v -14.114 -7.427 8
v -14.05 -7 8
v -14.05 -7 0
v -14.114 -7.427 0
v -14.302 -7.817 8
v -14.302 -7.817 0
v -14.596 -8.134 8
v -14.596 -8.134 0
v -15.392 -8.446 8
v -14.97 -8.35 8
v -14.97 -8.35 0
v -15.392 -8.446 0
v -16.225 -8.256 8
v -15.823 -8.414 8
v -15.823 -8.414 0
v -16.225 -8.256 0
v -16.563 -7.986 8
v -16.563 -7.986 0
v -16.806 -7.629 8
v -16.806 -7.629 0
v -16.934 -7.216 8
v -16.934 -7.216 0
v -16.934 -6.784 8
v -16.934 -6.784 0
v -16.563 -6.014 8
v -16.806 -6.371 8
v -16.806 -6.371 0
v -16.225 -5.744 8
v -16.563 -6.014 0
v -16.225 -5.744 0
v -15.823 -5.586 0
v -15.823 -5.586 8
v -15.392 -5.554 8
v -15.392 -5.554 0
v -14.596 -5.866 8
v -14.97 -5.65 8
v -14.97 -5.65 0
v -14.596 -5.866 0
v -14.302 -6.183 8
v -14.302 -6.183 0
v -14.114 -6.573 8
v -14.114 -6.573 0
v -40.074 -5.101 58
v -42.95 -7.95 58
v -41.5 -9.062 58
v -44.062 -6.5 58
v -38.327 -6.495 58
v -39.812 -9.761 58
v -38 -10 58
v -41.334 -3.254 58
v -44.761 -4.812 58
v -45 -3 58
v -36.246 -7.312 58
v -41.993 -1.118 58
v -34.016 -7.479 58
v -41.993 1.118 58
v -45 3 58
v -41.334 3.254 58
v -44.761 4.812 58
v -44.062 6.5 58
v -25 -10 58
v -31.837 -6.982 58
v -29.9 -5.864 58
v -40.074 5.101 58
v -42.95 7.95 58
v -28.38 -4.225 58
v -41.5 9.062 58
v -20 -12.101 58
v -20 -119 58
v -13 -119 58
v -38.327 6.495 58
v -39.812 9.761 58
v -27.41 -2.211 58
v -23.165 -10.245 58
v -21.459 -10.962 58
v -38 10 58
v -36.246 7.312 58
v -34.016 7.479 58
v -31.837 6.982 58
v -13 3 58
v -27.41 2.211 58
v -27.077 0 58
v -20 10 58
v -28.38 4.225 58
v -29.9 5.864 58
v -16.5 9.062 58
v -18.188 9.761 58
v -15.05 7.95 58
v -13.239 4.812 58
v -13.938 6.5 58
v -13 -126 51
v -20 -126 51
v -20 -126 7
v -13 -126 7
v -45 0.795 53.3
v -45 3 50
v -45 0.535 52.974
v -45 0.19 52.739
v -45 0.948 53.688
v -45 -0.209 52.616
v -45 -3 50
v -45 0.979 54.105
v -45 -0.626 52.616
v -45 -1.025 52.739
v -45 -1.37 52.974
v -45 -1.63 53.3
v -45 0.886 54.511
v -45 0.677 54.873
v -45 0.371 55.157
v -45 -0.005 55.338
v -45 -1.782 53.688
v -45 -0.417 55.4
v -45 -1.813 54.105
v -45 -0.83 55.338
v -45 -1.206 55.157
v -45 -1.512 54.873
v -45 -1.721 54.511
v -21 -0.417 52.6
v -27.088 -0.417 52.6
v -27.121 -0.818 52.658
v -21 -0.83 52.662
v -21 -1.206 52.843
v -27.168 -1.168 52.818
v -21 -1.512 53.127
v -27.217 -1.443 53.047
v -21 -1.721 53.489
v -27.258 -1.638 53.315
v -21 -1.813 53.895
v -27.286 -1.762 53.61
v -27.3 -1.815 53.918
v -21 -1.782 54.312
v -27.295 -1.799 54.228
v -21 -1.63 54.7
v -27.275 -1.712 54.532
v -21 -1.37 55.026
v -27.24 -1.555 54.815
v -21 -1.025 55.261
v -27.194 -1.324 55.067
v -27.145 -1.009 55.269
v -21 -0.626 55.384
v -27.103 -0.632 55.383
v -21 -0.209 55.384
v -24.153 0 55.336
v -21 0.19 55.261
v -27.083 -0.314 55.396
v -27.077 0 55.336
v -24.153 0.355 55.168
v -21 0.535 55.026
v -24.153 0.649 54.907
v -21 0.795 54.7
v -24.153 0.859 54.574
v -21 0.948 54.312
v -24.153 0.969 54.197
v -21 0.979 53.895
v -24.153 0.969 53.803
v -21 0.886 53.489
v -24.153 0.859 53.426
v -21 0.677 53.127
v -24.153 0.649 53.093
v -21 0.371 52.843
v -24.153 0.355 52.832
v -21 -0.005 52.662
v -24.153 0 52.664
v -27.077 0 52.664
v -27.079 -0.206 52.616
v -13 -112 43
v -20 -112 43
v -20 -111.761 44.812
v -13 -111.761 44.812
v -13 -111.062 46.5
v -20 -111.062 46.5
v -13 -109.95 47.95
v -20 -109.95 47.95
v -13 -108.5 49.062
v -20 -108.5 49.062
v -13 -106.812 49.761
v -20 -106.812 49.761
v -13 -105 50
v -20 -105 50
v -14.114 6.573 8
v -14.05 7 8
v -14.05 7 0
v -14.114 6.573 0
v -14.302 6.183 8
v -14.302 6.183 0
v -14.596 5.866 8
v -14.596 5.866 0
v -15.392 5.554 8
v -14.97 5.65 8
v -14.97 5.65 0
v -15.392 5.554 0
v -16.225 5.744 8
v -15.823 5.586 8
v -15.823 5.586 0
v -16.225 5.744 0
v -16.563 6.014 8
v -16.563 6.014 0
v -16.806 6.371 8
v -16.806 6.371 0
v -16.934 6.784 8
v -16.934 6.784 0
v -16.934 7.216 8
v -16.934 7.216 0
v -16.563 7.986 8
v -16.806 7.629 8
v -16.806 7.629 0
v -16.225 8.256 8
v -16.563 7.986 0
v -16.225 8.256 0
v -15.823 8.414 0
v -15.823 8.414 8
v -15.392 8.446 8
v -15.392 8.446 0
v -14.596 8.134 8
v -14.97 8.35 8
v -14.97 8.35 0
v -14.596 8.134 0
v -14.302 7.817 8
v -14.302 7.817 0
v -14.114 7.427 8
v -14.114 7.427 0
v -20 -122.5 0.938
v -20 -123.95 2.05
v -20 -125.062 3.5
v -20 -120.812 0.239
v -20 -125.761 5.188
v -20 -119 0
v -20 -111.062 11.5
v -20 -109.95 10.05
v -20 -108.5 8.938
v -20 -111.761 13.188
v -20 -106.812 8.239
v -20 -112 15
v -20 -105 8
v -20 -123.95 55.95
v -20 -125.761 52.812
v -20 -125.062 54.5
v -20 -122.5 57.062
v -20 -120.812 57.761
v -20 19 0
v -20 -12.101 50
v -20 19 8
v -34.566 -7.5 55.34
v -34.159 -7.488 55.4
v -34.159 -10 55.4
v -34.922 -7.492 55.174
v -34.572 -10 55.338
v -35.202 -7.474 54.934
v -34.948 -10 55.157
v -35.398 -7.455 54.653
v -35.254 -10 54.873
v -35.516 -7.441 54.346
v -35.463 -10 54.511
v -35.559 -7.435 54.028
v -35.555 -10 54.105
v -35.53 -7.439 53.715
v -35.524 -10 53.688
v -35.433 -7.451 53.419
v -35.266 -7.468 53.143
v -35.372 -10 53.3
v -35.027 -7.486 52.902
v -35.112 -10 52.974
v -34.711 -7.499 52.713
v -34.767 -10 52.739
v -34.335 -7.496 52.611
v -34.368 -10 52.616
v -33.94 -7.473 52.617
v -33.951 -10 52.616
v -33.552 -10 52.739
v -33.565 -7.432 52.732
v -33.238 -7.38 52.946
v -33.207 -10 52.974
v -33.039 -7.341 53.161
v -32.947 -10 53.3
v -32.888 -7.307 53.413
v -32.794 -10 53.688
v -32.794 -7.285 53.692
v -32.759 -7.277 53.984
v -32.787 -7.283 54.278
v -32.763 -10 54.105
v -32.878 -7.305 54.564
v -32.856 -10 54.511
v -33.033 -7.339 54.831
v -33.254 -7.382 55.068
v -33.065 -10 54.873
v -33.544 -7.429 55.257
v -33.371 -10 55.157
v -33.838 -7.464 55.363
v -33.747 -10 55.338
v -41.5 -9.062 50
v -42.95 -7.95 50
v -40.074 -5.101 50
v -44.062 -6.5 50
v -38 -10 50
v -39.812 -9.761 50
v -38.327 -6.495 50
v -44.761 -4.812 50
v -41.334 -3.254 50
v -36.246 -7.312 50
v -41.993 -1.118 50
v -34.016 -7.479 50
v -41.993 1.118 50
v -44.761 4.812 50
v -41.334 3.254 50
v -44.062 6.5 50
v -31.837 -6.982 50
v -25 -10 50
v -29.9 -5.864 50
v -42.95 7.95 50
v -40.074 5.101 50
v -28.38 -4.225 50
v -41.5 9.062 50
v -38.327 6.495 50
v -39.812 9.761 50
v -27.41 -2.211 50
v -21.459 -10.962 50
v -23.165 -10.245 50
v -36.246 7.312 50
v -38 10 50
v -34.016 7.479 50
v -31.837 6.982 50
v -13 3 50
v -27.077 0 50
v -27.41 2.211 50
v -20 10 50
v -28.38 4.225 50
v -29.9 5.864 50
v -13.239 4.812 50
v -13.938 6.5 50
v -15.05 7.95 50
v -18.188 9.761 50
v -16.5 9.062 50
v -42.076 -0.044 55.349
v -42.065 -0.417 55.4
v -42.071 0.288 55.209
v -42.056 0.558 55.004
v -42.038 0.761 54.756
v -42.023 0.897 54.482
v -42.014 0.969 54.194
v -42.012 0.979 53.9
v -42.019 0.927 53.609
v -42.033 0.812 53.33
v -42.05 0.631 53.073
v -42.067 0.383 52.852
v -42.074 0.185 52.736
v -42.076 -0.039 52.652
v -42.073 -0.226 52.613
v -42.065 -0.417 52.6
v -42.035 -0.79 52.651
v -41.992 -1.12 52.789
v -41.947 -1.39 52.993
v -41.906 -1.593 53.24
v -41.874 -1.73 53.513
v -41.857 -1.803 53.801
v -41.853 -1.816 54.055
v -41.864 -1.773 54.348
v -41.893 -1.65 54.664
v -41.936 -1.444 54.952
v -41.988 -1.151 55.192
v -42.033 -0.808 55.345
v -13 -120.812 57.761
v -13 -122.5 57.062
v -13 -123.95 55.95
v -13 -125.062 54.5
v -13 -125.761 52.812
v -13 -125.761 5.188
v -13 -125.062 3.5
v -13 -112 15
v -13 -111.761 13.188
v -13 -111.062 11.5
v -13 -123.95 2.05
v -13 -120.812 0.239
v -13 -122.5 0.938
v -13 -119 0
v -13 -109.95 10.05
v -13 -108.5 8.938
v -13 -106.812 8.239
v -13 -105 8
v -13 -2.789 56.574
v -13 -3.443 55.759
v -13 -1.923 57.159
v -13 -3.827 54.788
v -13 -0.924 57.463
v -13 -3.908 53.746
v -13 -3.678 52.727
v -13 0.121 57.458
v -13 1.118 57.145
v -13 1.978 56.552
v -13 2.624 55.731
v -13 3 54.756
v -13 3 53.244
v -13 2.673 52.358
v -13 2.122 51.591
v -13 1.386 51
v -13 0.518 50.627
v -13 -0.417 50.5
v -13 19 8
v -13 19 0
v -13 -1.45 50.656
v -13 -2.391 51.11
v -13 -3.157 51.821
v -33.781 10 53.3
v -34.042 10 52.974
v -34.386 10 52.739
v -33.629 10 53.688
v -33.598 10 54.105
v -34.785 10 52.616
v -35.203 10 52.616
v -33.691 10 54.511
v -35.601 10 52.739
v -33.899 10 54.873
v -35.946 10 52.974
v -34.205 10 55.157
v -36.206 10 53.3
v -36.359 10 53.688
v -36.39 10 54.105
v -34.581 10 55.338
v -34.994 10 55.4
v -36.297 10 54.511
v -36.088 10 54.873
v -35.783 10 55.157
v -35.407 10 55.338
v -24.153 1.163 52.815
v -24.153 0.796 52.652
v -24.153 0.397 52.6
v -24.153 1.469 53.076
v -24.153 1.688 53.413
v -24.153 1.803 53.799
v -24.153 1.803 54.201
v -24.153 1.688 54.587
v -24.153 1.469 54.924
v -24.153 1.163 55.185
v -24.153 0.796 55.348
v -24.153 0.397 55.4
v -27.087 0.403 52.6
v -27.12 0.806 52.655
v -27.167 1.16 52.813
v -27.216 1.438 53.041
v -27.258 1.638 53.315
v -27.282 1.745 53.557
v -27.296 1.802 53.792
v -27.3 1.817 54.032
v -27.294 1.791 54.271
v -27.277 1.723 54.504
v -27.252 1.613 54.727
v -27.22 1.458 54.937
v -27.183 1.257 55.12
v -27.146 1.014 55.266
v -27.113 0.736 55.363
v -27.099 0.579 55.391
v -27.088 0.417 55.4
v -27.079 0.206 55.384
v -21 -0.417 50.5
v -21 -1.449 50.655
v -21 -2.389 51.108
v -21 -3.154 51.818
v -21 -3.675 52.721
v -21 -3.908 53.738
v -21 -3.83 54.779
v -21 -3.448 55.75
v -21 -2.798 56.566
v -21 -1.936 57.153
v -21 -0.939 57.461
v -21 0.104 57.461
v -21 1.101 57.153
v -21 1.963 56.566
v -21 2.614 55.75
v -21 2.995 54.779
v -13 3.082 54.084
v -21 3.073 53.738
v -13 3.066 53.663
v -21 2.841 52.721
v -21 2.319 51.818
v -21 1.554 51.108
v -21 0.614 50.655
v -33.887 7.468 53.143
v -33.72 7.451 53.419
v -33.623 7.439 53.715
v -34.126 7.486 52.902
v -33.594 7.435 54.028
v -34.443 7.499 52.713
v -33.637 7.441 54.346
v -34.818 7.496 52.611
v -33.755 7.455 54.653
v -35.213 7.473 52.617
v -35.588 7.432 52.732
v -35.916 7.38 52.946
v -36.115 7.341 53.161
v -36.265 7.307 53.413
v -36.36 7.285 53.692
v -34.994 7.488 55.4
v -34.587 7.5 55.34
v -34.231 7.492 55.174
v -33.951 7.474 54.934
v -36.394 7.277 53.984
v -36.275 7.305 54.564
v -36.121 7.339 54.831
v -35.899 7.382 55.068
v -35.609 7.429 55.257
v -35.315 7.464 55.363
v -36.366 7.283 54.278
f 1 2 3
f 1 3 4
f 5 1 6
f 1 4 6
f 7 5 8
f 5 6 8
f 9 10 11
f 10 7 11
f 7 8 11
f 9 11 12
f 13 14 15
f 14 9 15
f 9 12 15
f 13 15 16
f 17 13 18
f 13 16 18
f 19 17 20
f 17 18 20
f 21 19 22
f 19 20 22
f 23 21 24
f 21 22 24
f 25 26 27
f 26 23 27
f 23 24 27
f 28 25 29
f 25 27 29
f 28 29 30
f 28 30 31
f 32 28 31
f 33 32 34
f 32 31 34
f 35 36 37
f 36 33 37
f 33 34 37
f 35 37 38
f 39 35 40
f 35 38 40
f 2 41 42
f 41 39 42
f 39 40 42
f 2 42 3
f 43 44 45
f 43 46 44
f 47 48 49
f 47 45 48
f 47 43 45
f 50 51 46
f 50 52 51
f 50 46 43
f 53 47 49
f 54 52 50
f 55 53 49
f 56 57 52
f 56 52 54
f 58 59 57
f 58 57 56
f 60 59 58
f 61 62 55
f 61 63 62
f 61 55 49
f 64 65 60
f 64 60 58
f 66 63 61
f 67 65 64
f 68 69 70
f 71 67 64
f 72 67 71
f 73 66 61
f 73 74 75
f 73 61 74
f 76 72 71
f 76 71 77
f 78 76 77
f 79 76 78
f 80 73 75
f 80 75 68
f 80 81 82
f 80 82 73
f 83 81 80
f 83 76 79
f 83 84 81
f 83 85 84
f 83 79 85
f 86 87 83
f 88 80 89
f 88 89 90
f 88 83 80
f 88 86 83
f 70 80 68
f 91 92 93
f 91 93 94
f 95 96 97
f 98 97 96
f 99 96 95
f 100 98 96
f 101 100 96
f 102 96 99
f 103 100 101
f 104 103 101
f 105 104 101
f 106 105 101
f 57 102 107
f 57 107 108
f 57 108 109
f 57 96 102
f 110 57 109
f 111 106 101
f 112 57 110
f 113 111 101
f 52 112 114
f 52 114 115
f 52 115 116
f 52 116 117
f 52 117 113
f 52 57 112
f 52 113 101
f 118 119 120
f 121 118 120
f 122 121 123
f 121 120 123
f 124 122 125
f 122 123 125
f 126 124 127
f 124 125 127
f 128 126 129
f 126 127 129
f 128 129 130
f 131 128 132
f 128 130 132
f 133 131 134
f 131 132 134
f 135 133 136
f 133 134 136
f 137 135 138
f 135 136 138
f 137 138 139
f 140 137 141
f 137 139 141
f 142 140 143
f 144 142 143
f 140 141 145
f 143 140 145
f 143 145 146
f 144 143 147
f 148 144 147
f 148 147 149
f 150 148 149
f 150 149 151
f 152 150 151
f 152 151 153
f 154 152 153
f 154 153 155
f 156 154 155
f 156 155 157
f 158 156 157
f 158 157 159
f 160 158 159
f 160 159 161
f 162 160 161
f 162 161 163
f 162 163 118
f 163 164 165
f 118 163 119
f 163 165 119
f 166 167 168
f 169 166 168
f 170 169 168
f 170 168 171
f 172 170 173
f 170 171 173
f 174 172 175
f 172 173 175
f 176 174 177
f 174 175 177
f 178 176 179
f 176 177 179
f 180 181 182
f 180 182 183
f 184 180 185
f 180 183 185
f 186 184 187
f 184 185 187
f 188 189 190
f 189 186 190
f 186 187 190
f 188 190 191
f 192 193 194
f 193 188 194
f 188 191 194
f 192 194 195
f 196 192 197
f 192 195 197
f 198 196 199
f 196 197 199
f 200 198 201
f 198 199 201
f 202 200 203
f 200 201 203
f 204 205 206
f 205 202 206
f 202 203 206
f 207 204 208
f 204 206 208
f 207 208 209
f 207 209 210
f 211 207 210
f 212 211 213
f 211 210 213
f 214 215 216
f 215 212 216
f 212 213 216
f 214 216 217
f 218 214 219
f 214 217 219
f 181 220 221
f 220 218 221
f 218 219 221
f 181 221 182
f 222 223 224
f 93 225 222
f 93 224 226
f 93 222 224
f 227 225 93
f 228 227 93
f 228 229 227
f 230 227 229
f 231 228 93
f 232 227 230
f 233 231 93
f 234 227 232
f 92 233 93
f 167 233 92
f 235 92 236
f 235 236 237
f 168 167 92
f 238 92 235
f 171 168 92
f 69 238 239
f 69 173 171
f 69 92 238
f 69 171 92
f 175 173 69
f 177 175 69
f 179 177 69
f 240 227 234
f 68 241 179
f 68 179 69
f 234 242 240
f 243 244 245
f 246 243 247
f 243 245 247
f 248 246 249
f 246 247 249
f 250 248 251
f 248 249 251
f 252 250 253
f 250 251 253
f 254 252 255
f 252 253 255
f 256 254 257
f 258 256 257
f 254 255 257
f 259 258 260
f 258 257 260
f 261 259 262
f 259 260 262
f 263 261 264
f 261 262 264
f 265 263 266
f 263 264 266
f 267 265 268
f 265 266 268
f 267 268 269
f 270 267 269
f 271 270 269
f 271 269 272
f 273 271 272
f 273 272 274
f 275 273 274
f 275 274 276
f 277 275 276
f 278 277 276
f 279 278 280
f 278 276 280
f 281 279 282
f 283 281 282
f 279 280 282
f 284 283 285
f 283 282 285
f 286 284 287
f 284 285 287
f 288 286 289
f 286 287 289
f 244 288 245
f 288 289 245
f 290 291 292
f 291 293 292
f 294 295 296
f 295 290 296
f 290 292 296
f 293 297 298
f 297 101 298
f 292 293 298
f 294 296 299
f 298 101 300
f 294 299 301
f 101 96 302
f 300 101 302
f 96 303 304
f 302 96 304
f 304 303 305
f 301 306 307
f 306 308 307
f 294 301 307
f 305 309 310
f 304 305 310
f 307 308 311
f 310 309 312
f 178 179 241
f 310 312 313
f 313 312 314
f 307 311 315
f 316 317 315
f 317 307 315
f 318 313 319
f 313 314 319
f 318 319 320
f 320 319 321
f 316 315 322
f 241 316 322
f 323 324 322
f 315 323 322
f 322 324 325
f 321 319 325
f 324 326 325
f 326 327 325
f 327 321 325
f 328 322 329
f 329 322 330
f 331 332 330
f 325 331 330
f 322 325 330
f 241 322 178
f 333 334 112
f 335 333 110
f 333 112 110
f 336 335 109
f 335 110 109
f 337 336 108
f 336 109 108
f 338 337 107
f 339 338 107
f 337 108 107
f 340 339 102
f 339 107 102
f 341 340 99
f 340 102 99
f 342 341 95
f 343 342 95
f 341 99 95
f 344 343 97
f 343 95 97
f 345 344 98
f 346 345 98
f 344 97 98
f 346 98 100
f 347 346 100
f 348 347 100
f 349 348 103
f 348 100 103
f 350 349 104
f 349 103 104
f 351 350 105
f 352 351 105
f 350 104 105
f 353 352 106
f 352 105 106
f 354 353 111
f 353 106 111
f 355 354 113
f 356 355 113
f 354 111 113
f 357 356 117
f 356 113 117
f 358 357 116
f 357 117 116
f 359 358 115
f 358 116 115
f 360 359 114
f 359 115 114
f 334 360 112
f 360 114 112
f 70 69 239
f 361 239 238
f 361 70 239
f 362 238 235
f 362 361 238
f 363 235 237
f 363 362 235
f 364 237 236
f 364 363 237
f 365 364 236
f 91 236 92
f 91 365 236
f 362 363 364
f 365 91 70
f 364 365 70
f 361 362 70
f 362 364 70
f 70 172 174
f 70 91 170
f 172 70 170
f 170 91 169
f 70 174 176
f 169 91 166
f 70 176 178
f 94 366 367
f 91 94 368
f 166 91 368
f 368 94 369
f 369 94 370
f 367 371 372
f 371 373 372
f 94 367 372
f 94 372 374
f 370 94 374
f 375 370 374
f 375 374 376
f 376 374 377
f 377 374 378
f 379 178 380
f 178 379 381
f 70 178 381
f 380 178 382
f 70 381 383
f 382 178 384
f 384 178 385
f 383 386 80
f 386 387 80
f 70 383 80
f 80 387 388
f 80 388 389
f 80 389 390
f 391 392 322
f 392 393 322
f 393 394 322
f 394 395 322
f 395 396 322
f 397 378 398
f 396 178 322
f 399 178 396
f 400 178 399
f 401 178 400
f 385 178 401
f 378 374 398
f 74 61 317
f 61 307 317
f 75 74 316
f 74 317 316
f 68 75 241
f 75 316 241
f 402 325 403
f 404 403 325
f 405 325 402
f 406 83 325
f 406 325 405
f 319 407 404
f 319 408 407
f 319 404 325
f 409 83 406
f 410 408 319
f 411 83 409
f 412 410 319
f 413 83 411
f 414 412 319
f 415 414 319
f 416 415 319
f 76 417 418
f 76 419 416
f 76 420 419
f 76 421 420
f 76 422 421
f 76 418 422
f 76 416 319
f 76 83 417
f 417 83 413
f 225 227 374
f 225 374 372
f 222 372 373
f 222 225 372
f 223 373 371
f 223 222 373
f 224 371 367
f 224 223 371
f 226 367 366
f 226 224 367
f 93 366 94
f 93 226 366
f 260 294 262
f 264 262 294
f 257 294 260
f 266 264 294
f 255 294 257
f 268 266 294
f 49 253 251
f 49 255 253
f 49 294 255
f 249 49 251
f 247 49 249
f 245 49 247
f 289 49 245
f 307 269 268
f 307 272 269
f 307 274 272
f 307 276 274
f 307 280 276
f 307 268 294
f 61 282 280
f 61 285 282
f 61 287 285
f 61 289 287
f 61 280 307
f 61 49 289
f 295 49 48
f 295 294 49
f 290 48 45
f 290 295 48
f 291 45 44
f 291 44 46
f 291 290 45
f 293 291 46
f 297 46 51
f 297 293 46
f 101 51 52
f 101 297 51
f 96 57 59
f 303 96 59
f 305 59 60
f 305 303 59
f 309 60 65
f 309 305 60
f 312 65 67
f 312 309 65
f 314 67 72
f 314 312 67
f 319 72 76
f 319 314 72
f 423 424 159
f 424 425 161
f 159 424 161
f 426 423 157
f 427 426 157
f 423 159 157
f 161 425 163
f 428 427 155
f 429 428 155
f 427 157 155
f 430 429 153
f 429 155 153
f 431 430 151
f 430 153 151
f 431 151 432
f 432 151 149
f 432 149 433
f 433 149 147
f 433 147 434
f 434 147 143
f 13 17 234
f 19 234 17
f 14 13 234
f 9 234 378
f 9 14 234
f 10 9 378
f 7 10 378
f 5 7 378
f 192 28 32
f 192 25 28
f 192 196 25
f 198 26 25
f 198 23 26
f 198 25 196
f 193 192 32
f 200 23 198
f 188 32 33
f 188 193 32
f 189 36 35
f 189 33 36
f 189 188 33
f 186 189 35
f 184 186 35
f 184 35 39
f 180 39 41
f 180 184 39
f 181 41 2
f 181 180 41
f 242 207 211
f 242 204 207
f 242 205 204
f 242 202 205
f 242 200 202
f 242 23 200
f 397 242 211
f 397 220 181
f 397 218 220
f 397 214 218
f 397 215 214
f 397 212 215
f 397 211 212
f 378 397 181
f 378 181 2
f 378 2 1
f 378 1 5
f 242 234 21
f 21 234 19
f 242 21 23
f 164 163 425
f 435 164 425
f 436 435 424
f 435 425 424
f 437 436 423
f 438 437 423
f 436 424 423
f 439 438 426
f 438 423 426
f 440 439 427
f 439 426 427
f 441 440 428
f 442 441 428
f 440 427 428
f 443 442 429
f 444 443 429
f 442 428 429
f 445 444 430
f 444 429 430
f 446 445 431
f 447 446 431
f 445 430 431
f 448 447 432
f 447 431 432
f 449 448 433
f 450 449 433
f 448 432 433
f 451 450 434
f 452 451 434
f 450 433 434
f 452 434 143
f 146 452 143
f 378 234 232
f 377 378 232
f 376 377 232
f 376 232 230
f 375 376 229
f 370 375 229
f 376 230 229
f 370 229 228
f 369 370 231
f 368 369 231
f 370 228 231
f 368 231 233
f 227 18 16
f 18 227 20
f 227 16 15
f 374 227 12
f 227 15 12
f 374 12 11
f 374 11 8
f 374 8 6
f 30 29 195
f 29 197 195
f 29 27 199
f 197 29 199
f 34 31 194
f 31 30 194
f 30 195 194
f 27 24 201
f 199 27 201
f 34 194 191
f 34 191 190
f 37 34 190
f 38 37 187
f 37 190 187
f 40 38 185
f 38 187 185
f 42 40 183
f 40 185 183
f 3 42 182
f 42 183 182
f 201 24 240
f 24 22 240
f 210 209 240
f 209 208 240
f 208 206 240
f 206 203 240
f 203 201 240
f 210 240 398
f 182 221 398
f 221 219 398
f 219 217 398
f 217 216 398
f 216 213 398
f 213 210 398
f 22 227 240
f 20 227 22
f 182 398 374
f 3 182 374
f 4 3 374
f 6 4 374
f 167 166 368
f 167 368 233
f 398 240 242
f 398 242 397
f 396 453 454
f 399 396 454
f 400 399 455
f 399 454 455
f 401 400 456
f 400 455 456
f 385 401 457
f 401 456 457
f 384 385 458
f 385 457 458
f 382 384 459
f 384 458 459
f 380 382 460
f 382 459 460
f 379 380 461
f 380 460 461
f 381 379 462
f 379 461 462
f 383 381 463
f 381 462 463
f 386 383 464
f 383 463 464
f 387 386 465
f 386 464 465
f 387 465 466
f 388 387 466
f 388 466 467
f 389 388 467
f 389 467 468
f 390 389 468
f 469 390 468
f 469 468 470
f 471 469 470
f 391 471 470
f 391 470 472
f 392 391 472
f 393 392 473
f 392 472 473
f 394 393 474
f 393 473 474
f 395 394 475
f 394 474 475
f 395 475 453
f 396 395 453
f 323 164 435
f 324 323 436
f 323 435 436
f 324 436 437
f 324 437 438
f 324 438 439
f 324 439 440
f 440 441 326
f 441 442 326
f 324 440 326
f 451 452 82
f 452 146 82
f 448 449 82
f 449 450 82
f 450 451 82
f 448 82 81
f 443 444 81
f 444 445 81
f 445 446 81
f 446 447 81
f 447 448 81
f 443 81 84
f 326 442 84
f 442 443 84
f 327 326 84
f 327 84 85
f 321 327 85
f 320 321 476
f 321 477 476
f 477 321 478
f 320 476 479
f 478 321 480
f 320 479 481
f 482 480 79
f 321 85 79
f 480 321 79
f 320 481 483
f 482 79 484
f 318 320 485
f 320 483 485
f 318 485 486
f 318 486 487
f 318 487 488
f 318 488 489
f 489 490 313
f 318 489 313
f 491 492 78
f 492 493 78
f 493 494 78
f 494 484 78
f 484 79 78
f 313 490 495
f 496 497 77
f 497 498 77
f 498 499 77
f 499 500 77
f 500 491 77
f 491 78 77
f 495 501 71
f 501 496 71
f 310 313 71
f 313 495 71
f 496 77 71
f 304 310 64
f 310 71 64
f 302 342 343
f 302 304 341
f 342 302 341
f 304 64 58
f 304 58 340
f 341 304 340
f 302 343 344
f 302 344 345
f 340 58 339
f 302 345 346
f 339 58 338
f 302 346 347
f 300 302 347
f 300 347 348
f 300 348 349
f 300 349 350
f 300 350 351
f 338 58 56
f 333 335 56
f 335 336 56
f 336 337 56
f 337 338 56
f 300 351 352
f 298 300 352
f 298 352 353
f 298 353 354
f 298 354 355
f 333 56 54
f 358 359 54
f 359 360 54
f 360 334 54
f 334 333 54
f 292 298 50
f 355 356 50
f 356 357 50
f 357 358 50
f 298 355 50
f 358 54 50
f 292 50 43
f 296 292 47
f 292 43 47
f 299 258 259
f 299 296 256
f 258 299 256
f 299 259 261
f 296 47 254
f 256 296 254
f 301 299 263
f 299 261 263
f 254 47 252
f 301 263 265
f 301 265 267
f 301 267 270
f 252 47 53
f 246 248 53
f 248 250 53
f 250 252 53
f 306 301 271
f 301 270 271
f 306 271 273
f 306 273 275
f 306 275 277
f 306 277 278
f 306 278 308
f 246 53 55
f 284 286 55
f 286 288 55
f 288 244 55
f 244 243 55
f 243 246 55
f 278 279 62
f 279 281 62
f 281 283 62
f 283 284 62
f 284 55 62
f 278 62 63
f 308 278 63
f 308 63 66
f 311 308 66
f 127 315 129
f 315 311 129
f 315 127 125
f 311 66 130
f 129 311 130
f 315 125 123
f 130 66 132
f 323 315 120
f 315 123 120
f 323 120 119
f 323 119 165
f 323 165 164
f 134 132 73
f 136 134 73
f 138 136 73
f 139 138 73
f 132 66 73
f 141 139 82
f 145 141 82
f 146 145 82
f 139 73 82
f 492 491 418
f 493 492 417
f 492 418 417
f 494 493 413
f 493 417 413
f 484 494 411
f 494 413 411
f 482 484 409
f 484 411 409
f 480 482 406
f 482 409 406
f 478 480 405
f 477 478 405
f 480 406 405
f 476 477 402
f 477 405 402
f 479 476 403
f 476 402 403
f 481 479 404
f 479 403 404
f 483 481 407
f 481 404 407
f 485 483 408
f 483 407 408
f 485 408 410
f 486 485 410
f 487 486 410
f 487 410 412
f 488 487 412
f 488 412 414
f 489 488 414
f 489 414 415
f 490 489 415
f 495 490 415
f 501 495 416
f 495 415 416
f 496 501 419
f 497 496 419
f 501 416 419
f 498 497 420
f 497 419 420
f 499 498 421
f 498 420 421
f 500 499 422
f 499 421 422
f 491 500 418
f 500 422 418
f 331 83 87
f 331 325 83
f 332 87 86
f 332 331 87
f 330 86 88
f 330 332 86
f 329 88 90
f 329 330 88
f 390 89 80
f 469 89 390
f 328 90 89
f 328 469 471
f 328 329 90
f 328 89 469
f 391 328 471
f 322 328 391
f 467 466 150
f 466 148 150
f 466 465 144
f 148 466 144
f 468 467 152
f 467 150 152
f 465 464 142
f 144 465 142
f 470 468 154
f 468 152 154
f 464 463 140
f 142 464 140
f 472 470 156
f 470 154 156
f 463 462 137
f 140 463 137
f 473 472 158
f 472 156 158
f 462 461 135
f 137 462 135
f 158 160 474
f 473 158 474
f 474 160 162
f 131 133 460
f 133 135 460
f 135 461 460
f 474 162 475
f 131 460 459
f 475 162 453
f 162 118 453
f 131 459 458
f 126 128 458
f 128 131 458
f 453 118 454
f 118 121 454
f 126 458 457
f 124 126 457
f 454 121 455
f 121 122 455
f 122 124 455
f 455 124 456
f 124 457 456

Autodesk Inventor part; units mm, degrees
ref_plane "YZ Plane" through (0, 0, 0) normal (1, 0, 0) x (0, 1, 0)
ref_plane "XZ Plane" through (0, 0, 0) normal (0, 1, 0) x (-1, 0, 0)
ref_plane "XY Plane" through (0, 0, 0) normal (0, 0, 1) x (1, 0, 0)
ref_plane "Work Plane1" through (0, 0, 0) normal (0, 0, 1) x (1, 0, 0)
sketch "Sketch1" plane through (0, 0, 0) normal (0, 0, 1) x (1, 0, 0)
  circle A0 centre (-15.5, 7) radius 1.45 projected
  circle A1 centre (-15.5, -7) radius 1.45 projected
  line L0 (63, 19) -> (63, -19) projected
  circle A2 centre (56, -16.5) radius 1.45 projected
  circle A3 centre (60.5, 16.5) radius 1.45 projected
  circle A4 centre (-15.5, 7) radius 1.45 projected
  circle A5 centre (-15.5, -7) radius 1.45 projected
  circle A6 centre (60.5, -16.5) radius 1.45 projected
  circle A7 centre (56, 16.5) radius 1.45 projected
  circle A8 centre (10, 10) radius 1.75 projected
  circle A9 centre (-10, -10) radius 1.75 projected
  circle A10 centre (10, -10) radius 1.75 projected
  line L1 (31.25, -14.25) -> (31.25, 14.25) projected
  line L2 (31.25, 14.25) -> (59.75, 14.25) projected
  line L3 (59.75, 14.25) -> (59.75, -14.25) projected
  line L4 (59.75, -14.25) -> (31.25, -14.25) projected
  circle A11 centre (-10, 10) radius 1.75 projected
  line L5 (-18, 19) -> (63, 19) projected
  line L6 (-18, -19) -> (-18, 19) projected
  line L7 (63, -19) -> (-18, -19) projected
  line L8 (63, 19) -> (63, -19) projected
  line L9 (-18, 19) -> (-13, 19)
  line L10 (-13, 19) -> (-13, -126)
  line L11 (-13, -126) -> (-18, -126)
  line L12 (-18, -126) -> (-18, 19)
  point P0 (0, 0)
  dimension "d0" = 5
  dimension "d1" = 145
extrude "Extrusion1" add sketch "Sketch1" along normal blind 8 contours L10 L7 L6 L5 | L10 L11 L12 L7
sketch "Sketch2" plane through (0, 0, 8) normal (0, 0, 1) x (1, 0, 0)
  circle A0 centre (-15.5, -7) radius 1.45 projected
  circle A1 centre (-15.5, 7) radius 1.45 projected
  line L0 (-13, 19) -> (-18, 19) projected
  line L1 (-18, 19) -> (-18, -126) projected
  line L2 (-18, -126) -> (-13, -126) projected
  line L3 (-13, -126) -> (-13, 19) projected
  line L4 (-18, 19) -> (-18, -126) projected
  line L5 (-13, -126) -> (-13, 19) projected
  line L6 (-18, -126) -> (-13, -126)
  line L7 (-13, -126) -> (-13, -112)
  line L8 (-13, -112) -> (-18, -112)
  line L9 (-18, -112) -> (-18, -126)
  point P0 (0, 0)
  dimension "d4" = 14
extrude "Extrusion2" add sketch "Sketch2" along normal blind 50 contours L3 L2 L1 L8
sketch "Sketch3" plane through (0, 0, 58) normal (0, 0, 1) x (1, 0, 0)
  circle A0 centre (-34.5766, 0) radius 2.4142 projected
  line L0 (-18, -126) -> (-13, -126) projected
  line L1 (-13, -126) -> (-13, -112) projected
  line L2 (-13, -112) -> (-18, -112) projected
  line L3 (-18, -112) -> (-18, -126) projected
  line L4 (-13, 19) -> (-13, -126) projected
  line L5 (-18, -112) -> (-13, -112)
  line L6 (-13, -112) -> (-13, 10)
  line L7 (-13, 10) -> (-18, 10)
  line L8 (-18, 10) -> (-18, -112)
  line L9 (-18, 10) -> (-45, 10)
  line L10 (-45, 10) -> (-45, -10)
  line L11 (-45, -10) -> (-18, -10)
  line L12 (-18, -10) -> (-18, 10)
  circle A1 centre (-34.5766, 0) radius 2.5
  circle A2 centre (-34.5766, 0) radius 7.5
  point P0 (0, 0)
  dimension "d7" = 122
  dimension "d8" = 27
  dimension "d9" = 20
  dimension "d10" = 5
  dimension "d16" = 15
extrude "Extrusion3" add sketch "Sketch3" against normal blind 8 contours L3 L2 L1 L0 | L8 L7 L4 L2 | L11 L10 L9 L8
fillet "Fillet1" radius 7 8 edges at (-15.5, -112, 50) (-15.5, -112, 8) (-15.5, -126, 58) (-15.5, -126, 0) (-18, -10, 54) (-13, 10, 54) (-45, 10, 54) (-45, -10, 54)
sketch "Sketch4" plane through (-18, 19, 0) normal (-1, 0, 0) x (0, 0, 1)
  line L0 (50, -36) -> (58, -36) projected
  line L1 (50, -124) -> (50, -36) projected
  arc A0 (43, -131) -> (50, -124) centre (43, -124) ccw projected
  line L2 (15, -131) -> (43, -131) projected
  arc A1 (8, -124) -> (15, -131) centre (15, -124) ccw projected
  line L3 (8, 0) -> (8, -124) projected
  line L4 (0, 0) -> (8, 0) projected
  line L5 (0, -138) -> (0, 0) projected
  arc A2 (0, -138) -> (7, -145) centre (7, -138) ccw projected
  line L6 (7, -145) -> (51, -145) projected
  arc A3 (51, -145) -> (58, -138) centre (51, -138) ccw projected
  line L7 (58, -138) -> (58, -36) projected
  line L8 (50, -29) -> (50, -36) projected
  line L9 (50, -36) -> (58, -36) projected
  line L10 (58, -36) -> (58, -29) projected
  line L11 (58, -29) -> (50, -29) projected
  point P0 (0, -19)
extrude "Extrusion4" add sketch "Sketch4" along normal blind 2
sketch "Sketch5" plane through (-45, -3, 58) normal (-1, 0, 0) x (0, 0, 1)
  line L0 (0, 0) -> (-8, 0) projected
  line L1 (0, 6) -> (0, 0) projected
  line L2 (-8, 6) -> (0, 6) projected
  line L3 (-8, 0) -> (-8, 6) projected
  circle A0 centre (-4, 2.5827) radius 1.4
  point P0 (-58, 3)
  dimension "d17" = 2.8
extrude "Extrusion5" cut sketch "Sketch5" against normal blind 10 contours A0
pattern_circular "Circular Pattern1" count 4 over 360 about axis through (-34.5766, 0, 58) along (0, 0, -1) of "Extrusion5"
sketch "Sketch6" plane through (-13, 19, 8) normal (1, 0, 0) x (0, 0, -1)
  circle A0 centre (-46, -19.4173) radius 1.4 projected
  point P0 (8, -19)
  point P1 (-46, -20.8173)
hole "Hole1" at (-13, -0.4173, 54) direction (-1, 0, 0) diameter 2.8 end through all counterbore diameter 7 counterbore depth 8
properties part number "06_Fluorescence_Arm"
